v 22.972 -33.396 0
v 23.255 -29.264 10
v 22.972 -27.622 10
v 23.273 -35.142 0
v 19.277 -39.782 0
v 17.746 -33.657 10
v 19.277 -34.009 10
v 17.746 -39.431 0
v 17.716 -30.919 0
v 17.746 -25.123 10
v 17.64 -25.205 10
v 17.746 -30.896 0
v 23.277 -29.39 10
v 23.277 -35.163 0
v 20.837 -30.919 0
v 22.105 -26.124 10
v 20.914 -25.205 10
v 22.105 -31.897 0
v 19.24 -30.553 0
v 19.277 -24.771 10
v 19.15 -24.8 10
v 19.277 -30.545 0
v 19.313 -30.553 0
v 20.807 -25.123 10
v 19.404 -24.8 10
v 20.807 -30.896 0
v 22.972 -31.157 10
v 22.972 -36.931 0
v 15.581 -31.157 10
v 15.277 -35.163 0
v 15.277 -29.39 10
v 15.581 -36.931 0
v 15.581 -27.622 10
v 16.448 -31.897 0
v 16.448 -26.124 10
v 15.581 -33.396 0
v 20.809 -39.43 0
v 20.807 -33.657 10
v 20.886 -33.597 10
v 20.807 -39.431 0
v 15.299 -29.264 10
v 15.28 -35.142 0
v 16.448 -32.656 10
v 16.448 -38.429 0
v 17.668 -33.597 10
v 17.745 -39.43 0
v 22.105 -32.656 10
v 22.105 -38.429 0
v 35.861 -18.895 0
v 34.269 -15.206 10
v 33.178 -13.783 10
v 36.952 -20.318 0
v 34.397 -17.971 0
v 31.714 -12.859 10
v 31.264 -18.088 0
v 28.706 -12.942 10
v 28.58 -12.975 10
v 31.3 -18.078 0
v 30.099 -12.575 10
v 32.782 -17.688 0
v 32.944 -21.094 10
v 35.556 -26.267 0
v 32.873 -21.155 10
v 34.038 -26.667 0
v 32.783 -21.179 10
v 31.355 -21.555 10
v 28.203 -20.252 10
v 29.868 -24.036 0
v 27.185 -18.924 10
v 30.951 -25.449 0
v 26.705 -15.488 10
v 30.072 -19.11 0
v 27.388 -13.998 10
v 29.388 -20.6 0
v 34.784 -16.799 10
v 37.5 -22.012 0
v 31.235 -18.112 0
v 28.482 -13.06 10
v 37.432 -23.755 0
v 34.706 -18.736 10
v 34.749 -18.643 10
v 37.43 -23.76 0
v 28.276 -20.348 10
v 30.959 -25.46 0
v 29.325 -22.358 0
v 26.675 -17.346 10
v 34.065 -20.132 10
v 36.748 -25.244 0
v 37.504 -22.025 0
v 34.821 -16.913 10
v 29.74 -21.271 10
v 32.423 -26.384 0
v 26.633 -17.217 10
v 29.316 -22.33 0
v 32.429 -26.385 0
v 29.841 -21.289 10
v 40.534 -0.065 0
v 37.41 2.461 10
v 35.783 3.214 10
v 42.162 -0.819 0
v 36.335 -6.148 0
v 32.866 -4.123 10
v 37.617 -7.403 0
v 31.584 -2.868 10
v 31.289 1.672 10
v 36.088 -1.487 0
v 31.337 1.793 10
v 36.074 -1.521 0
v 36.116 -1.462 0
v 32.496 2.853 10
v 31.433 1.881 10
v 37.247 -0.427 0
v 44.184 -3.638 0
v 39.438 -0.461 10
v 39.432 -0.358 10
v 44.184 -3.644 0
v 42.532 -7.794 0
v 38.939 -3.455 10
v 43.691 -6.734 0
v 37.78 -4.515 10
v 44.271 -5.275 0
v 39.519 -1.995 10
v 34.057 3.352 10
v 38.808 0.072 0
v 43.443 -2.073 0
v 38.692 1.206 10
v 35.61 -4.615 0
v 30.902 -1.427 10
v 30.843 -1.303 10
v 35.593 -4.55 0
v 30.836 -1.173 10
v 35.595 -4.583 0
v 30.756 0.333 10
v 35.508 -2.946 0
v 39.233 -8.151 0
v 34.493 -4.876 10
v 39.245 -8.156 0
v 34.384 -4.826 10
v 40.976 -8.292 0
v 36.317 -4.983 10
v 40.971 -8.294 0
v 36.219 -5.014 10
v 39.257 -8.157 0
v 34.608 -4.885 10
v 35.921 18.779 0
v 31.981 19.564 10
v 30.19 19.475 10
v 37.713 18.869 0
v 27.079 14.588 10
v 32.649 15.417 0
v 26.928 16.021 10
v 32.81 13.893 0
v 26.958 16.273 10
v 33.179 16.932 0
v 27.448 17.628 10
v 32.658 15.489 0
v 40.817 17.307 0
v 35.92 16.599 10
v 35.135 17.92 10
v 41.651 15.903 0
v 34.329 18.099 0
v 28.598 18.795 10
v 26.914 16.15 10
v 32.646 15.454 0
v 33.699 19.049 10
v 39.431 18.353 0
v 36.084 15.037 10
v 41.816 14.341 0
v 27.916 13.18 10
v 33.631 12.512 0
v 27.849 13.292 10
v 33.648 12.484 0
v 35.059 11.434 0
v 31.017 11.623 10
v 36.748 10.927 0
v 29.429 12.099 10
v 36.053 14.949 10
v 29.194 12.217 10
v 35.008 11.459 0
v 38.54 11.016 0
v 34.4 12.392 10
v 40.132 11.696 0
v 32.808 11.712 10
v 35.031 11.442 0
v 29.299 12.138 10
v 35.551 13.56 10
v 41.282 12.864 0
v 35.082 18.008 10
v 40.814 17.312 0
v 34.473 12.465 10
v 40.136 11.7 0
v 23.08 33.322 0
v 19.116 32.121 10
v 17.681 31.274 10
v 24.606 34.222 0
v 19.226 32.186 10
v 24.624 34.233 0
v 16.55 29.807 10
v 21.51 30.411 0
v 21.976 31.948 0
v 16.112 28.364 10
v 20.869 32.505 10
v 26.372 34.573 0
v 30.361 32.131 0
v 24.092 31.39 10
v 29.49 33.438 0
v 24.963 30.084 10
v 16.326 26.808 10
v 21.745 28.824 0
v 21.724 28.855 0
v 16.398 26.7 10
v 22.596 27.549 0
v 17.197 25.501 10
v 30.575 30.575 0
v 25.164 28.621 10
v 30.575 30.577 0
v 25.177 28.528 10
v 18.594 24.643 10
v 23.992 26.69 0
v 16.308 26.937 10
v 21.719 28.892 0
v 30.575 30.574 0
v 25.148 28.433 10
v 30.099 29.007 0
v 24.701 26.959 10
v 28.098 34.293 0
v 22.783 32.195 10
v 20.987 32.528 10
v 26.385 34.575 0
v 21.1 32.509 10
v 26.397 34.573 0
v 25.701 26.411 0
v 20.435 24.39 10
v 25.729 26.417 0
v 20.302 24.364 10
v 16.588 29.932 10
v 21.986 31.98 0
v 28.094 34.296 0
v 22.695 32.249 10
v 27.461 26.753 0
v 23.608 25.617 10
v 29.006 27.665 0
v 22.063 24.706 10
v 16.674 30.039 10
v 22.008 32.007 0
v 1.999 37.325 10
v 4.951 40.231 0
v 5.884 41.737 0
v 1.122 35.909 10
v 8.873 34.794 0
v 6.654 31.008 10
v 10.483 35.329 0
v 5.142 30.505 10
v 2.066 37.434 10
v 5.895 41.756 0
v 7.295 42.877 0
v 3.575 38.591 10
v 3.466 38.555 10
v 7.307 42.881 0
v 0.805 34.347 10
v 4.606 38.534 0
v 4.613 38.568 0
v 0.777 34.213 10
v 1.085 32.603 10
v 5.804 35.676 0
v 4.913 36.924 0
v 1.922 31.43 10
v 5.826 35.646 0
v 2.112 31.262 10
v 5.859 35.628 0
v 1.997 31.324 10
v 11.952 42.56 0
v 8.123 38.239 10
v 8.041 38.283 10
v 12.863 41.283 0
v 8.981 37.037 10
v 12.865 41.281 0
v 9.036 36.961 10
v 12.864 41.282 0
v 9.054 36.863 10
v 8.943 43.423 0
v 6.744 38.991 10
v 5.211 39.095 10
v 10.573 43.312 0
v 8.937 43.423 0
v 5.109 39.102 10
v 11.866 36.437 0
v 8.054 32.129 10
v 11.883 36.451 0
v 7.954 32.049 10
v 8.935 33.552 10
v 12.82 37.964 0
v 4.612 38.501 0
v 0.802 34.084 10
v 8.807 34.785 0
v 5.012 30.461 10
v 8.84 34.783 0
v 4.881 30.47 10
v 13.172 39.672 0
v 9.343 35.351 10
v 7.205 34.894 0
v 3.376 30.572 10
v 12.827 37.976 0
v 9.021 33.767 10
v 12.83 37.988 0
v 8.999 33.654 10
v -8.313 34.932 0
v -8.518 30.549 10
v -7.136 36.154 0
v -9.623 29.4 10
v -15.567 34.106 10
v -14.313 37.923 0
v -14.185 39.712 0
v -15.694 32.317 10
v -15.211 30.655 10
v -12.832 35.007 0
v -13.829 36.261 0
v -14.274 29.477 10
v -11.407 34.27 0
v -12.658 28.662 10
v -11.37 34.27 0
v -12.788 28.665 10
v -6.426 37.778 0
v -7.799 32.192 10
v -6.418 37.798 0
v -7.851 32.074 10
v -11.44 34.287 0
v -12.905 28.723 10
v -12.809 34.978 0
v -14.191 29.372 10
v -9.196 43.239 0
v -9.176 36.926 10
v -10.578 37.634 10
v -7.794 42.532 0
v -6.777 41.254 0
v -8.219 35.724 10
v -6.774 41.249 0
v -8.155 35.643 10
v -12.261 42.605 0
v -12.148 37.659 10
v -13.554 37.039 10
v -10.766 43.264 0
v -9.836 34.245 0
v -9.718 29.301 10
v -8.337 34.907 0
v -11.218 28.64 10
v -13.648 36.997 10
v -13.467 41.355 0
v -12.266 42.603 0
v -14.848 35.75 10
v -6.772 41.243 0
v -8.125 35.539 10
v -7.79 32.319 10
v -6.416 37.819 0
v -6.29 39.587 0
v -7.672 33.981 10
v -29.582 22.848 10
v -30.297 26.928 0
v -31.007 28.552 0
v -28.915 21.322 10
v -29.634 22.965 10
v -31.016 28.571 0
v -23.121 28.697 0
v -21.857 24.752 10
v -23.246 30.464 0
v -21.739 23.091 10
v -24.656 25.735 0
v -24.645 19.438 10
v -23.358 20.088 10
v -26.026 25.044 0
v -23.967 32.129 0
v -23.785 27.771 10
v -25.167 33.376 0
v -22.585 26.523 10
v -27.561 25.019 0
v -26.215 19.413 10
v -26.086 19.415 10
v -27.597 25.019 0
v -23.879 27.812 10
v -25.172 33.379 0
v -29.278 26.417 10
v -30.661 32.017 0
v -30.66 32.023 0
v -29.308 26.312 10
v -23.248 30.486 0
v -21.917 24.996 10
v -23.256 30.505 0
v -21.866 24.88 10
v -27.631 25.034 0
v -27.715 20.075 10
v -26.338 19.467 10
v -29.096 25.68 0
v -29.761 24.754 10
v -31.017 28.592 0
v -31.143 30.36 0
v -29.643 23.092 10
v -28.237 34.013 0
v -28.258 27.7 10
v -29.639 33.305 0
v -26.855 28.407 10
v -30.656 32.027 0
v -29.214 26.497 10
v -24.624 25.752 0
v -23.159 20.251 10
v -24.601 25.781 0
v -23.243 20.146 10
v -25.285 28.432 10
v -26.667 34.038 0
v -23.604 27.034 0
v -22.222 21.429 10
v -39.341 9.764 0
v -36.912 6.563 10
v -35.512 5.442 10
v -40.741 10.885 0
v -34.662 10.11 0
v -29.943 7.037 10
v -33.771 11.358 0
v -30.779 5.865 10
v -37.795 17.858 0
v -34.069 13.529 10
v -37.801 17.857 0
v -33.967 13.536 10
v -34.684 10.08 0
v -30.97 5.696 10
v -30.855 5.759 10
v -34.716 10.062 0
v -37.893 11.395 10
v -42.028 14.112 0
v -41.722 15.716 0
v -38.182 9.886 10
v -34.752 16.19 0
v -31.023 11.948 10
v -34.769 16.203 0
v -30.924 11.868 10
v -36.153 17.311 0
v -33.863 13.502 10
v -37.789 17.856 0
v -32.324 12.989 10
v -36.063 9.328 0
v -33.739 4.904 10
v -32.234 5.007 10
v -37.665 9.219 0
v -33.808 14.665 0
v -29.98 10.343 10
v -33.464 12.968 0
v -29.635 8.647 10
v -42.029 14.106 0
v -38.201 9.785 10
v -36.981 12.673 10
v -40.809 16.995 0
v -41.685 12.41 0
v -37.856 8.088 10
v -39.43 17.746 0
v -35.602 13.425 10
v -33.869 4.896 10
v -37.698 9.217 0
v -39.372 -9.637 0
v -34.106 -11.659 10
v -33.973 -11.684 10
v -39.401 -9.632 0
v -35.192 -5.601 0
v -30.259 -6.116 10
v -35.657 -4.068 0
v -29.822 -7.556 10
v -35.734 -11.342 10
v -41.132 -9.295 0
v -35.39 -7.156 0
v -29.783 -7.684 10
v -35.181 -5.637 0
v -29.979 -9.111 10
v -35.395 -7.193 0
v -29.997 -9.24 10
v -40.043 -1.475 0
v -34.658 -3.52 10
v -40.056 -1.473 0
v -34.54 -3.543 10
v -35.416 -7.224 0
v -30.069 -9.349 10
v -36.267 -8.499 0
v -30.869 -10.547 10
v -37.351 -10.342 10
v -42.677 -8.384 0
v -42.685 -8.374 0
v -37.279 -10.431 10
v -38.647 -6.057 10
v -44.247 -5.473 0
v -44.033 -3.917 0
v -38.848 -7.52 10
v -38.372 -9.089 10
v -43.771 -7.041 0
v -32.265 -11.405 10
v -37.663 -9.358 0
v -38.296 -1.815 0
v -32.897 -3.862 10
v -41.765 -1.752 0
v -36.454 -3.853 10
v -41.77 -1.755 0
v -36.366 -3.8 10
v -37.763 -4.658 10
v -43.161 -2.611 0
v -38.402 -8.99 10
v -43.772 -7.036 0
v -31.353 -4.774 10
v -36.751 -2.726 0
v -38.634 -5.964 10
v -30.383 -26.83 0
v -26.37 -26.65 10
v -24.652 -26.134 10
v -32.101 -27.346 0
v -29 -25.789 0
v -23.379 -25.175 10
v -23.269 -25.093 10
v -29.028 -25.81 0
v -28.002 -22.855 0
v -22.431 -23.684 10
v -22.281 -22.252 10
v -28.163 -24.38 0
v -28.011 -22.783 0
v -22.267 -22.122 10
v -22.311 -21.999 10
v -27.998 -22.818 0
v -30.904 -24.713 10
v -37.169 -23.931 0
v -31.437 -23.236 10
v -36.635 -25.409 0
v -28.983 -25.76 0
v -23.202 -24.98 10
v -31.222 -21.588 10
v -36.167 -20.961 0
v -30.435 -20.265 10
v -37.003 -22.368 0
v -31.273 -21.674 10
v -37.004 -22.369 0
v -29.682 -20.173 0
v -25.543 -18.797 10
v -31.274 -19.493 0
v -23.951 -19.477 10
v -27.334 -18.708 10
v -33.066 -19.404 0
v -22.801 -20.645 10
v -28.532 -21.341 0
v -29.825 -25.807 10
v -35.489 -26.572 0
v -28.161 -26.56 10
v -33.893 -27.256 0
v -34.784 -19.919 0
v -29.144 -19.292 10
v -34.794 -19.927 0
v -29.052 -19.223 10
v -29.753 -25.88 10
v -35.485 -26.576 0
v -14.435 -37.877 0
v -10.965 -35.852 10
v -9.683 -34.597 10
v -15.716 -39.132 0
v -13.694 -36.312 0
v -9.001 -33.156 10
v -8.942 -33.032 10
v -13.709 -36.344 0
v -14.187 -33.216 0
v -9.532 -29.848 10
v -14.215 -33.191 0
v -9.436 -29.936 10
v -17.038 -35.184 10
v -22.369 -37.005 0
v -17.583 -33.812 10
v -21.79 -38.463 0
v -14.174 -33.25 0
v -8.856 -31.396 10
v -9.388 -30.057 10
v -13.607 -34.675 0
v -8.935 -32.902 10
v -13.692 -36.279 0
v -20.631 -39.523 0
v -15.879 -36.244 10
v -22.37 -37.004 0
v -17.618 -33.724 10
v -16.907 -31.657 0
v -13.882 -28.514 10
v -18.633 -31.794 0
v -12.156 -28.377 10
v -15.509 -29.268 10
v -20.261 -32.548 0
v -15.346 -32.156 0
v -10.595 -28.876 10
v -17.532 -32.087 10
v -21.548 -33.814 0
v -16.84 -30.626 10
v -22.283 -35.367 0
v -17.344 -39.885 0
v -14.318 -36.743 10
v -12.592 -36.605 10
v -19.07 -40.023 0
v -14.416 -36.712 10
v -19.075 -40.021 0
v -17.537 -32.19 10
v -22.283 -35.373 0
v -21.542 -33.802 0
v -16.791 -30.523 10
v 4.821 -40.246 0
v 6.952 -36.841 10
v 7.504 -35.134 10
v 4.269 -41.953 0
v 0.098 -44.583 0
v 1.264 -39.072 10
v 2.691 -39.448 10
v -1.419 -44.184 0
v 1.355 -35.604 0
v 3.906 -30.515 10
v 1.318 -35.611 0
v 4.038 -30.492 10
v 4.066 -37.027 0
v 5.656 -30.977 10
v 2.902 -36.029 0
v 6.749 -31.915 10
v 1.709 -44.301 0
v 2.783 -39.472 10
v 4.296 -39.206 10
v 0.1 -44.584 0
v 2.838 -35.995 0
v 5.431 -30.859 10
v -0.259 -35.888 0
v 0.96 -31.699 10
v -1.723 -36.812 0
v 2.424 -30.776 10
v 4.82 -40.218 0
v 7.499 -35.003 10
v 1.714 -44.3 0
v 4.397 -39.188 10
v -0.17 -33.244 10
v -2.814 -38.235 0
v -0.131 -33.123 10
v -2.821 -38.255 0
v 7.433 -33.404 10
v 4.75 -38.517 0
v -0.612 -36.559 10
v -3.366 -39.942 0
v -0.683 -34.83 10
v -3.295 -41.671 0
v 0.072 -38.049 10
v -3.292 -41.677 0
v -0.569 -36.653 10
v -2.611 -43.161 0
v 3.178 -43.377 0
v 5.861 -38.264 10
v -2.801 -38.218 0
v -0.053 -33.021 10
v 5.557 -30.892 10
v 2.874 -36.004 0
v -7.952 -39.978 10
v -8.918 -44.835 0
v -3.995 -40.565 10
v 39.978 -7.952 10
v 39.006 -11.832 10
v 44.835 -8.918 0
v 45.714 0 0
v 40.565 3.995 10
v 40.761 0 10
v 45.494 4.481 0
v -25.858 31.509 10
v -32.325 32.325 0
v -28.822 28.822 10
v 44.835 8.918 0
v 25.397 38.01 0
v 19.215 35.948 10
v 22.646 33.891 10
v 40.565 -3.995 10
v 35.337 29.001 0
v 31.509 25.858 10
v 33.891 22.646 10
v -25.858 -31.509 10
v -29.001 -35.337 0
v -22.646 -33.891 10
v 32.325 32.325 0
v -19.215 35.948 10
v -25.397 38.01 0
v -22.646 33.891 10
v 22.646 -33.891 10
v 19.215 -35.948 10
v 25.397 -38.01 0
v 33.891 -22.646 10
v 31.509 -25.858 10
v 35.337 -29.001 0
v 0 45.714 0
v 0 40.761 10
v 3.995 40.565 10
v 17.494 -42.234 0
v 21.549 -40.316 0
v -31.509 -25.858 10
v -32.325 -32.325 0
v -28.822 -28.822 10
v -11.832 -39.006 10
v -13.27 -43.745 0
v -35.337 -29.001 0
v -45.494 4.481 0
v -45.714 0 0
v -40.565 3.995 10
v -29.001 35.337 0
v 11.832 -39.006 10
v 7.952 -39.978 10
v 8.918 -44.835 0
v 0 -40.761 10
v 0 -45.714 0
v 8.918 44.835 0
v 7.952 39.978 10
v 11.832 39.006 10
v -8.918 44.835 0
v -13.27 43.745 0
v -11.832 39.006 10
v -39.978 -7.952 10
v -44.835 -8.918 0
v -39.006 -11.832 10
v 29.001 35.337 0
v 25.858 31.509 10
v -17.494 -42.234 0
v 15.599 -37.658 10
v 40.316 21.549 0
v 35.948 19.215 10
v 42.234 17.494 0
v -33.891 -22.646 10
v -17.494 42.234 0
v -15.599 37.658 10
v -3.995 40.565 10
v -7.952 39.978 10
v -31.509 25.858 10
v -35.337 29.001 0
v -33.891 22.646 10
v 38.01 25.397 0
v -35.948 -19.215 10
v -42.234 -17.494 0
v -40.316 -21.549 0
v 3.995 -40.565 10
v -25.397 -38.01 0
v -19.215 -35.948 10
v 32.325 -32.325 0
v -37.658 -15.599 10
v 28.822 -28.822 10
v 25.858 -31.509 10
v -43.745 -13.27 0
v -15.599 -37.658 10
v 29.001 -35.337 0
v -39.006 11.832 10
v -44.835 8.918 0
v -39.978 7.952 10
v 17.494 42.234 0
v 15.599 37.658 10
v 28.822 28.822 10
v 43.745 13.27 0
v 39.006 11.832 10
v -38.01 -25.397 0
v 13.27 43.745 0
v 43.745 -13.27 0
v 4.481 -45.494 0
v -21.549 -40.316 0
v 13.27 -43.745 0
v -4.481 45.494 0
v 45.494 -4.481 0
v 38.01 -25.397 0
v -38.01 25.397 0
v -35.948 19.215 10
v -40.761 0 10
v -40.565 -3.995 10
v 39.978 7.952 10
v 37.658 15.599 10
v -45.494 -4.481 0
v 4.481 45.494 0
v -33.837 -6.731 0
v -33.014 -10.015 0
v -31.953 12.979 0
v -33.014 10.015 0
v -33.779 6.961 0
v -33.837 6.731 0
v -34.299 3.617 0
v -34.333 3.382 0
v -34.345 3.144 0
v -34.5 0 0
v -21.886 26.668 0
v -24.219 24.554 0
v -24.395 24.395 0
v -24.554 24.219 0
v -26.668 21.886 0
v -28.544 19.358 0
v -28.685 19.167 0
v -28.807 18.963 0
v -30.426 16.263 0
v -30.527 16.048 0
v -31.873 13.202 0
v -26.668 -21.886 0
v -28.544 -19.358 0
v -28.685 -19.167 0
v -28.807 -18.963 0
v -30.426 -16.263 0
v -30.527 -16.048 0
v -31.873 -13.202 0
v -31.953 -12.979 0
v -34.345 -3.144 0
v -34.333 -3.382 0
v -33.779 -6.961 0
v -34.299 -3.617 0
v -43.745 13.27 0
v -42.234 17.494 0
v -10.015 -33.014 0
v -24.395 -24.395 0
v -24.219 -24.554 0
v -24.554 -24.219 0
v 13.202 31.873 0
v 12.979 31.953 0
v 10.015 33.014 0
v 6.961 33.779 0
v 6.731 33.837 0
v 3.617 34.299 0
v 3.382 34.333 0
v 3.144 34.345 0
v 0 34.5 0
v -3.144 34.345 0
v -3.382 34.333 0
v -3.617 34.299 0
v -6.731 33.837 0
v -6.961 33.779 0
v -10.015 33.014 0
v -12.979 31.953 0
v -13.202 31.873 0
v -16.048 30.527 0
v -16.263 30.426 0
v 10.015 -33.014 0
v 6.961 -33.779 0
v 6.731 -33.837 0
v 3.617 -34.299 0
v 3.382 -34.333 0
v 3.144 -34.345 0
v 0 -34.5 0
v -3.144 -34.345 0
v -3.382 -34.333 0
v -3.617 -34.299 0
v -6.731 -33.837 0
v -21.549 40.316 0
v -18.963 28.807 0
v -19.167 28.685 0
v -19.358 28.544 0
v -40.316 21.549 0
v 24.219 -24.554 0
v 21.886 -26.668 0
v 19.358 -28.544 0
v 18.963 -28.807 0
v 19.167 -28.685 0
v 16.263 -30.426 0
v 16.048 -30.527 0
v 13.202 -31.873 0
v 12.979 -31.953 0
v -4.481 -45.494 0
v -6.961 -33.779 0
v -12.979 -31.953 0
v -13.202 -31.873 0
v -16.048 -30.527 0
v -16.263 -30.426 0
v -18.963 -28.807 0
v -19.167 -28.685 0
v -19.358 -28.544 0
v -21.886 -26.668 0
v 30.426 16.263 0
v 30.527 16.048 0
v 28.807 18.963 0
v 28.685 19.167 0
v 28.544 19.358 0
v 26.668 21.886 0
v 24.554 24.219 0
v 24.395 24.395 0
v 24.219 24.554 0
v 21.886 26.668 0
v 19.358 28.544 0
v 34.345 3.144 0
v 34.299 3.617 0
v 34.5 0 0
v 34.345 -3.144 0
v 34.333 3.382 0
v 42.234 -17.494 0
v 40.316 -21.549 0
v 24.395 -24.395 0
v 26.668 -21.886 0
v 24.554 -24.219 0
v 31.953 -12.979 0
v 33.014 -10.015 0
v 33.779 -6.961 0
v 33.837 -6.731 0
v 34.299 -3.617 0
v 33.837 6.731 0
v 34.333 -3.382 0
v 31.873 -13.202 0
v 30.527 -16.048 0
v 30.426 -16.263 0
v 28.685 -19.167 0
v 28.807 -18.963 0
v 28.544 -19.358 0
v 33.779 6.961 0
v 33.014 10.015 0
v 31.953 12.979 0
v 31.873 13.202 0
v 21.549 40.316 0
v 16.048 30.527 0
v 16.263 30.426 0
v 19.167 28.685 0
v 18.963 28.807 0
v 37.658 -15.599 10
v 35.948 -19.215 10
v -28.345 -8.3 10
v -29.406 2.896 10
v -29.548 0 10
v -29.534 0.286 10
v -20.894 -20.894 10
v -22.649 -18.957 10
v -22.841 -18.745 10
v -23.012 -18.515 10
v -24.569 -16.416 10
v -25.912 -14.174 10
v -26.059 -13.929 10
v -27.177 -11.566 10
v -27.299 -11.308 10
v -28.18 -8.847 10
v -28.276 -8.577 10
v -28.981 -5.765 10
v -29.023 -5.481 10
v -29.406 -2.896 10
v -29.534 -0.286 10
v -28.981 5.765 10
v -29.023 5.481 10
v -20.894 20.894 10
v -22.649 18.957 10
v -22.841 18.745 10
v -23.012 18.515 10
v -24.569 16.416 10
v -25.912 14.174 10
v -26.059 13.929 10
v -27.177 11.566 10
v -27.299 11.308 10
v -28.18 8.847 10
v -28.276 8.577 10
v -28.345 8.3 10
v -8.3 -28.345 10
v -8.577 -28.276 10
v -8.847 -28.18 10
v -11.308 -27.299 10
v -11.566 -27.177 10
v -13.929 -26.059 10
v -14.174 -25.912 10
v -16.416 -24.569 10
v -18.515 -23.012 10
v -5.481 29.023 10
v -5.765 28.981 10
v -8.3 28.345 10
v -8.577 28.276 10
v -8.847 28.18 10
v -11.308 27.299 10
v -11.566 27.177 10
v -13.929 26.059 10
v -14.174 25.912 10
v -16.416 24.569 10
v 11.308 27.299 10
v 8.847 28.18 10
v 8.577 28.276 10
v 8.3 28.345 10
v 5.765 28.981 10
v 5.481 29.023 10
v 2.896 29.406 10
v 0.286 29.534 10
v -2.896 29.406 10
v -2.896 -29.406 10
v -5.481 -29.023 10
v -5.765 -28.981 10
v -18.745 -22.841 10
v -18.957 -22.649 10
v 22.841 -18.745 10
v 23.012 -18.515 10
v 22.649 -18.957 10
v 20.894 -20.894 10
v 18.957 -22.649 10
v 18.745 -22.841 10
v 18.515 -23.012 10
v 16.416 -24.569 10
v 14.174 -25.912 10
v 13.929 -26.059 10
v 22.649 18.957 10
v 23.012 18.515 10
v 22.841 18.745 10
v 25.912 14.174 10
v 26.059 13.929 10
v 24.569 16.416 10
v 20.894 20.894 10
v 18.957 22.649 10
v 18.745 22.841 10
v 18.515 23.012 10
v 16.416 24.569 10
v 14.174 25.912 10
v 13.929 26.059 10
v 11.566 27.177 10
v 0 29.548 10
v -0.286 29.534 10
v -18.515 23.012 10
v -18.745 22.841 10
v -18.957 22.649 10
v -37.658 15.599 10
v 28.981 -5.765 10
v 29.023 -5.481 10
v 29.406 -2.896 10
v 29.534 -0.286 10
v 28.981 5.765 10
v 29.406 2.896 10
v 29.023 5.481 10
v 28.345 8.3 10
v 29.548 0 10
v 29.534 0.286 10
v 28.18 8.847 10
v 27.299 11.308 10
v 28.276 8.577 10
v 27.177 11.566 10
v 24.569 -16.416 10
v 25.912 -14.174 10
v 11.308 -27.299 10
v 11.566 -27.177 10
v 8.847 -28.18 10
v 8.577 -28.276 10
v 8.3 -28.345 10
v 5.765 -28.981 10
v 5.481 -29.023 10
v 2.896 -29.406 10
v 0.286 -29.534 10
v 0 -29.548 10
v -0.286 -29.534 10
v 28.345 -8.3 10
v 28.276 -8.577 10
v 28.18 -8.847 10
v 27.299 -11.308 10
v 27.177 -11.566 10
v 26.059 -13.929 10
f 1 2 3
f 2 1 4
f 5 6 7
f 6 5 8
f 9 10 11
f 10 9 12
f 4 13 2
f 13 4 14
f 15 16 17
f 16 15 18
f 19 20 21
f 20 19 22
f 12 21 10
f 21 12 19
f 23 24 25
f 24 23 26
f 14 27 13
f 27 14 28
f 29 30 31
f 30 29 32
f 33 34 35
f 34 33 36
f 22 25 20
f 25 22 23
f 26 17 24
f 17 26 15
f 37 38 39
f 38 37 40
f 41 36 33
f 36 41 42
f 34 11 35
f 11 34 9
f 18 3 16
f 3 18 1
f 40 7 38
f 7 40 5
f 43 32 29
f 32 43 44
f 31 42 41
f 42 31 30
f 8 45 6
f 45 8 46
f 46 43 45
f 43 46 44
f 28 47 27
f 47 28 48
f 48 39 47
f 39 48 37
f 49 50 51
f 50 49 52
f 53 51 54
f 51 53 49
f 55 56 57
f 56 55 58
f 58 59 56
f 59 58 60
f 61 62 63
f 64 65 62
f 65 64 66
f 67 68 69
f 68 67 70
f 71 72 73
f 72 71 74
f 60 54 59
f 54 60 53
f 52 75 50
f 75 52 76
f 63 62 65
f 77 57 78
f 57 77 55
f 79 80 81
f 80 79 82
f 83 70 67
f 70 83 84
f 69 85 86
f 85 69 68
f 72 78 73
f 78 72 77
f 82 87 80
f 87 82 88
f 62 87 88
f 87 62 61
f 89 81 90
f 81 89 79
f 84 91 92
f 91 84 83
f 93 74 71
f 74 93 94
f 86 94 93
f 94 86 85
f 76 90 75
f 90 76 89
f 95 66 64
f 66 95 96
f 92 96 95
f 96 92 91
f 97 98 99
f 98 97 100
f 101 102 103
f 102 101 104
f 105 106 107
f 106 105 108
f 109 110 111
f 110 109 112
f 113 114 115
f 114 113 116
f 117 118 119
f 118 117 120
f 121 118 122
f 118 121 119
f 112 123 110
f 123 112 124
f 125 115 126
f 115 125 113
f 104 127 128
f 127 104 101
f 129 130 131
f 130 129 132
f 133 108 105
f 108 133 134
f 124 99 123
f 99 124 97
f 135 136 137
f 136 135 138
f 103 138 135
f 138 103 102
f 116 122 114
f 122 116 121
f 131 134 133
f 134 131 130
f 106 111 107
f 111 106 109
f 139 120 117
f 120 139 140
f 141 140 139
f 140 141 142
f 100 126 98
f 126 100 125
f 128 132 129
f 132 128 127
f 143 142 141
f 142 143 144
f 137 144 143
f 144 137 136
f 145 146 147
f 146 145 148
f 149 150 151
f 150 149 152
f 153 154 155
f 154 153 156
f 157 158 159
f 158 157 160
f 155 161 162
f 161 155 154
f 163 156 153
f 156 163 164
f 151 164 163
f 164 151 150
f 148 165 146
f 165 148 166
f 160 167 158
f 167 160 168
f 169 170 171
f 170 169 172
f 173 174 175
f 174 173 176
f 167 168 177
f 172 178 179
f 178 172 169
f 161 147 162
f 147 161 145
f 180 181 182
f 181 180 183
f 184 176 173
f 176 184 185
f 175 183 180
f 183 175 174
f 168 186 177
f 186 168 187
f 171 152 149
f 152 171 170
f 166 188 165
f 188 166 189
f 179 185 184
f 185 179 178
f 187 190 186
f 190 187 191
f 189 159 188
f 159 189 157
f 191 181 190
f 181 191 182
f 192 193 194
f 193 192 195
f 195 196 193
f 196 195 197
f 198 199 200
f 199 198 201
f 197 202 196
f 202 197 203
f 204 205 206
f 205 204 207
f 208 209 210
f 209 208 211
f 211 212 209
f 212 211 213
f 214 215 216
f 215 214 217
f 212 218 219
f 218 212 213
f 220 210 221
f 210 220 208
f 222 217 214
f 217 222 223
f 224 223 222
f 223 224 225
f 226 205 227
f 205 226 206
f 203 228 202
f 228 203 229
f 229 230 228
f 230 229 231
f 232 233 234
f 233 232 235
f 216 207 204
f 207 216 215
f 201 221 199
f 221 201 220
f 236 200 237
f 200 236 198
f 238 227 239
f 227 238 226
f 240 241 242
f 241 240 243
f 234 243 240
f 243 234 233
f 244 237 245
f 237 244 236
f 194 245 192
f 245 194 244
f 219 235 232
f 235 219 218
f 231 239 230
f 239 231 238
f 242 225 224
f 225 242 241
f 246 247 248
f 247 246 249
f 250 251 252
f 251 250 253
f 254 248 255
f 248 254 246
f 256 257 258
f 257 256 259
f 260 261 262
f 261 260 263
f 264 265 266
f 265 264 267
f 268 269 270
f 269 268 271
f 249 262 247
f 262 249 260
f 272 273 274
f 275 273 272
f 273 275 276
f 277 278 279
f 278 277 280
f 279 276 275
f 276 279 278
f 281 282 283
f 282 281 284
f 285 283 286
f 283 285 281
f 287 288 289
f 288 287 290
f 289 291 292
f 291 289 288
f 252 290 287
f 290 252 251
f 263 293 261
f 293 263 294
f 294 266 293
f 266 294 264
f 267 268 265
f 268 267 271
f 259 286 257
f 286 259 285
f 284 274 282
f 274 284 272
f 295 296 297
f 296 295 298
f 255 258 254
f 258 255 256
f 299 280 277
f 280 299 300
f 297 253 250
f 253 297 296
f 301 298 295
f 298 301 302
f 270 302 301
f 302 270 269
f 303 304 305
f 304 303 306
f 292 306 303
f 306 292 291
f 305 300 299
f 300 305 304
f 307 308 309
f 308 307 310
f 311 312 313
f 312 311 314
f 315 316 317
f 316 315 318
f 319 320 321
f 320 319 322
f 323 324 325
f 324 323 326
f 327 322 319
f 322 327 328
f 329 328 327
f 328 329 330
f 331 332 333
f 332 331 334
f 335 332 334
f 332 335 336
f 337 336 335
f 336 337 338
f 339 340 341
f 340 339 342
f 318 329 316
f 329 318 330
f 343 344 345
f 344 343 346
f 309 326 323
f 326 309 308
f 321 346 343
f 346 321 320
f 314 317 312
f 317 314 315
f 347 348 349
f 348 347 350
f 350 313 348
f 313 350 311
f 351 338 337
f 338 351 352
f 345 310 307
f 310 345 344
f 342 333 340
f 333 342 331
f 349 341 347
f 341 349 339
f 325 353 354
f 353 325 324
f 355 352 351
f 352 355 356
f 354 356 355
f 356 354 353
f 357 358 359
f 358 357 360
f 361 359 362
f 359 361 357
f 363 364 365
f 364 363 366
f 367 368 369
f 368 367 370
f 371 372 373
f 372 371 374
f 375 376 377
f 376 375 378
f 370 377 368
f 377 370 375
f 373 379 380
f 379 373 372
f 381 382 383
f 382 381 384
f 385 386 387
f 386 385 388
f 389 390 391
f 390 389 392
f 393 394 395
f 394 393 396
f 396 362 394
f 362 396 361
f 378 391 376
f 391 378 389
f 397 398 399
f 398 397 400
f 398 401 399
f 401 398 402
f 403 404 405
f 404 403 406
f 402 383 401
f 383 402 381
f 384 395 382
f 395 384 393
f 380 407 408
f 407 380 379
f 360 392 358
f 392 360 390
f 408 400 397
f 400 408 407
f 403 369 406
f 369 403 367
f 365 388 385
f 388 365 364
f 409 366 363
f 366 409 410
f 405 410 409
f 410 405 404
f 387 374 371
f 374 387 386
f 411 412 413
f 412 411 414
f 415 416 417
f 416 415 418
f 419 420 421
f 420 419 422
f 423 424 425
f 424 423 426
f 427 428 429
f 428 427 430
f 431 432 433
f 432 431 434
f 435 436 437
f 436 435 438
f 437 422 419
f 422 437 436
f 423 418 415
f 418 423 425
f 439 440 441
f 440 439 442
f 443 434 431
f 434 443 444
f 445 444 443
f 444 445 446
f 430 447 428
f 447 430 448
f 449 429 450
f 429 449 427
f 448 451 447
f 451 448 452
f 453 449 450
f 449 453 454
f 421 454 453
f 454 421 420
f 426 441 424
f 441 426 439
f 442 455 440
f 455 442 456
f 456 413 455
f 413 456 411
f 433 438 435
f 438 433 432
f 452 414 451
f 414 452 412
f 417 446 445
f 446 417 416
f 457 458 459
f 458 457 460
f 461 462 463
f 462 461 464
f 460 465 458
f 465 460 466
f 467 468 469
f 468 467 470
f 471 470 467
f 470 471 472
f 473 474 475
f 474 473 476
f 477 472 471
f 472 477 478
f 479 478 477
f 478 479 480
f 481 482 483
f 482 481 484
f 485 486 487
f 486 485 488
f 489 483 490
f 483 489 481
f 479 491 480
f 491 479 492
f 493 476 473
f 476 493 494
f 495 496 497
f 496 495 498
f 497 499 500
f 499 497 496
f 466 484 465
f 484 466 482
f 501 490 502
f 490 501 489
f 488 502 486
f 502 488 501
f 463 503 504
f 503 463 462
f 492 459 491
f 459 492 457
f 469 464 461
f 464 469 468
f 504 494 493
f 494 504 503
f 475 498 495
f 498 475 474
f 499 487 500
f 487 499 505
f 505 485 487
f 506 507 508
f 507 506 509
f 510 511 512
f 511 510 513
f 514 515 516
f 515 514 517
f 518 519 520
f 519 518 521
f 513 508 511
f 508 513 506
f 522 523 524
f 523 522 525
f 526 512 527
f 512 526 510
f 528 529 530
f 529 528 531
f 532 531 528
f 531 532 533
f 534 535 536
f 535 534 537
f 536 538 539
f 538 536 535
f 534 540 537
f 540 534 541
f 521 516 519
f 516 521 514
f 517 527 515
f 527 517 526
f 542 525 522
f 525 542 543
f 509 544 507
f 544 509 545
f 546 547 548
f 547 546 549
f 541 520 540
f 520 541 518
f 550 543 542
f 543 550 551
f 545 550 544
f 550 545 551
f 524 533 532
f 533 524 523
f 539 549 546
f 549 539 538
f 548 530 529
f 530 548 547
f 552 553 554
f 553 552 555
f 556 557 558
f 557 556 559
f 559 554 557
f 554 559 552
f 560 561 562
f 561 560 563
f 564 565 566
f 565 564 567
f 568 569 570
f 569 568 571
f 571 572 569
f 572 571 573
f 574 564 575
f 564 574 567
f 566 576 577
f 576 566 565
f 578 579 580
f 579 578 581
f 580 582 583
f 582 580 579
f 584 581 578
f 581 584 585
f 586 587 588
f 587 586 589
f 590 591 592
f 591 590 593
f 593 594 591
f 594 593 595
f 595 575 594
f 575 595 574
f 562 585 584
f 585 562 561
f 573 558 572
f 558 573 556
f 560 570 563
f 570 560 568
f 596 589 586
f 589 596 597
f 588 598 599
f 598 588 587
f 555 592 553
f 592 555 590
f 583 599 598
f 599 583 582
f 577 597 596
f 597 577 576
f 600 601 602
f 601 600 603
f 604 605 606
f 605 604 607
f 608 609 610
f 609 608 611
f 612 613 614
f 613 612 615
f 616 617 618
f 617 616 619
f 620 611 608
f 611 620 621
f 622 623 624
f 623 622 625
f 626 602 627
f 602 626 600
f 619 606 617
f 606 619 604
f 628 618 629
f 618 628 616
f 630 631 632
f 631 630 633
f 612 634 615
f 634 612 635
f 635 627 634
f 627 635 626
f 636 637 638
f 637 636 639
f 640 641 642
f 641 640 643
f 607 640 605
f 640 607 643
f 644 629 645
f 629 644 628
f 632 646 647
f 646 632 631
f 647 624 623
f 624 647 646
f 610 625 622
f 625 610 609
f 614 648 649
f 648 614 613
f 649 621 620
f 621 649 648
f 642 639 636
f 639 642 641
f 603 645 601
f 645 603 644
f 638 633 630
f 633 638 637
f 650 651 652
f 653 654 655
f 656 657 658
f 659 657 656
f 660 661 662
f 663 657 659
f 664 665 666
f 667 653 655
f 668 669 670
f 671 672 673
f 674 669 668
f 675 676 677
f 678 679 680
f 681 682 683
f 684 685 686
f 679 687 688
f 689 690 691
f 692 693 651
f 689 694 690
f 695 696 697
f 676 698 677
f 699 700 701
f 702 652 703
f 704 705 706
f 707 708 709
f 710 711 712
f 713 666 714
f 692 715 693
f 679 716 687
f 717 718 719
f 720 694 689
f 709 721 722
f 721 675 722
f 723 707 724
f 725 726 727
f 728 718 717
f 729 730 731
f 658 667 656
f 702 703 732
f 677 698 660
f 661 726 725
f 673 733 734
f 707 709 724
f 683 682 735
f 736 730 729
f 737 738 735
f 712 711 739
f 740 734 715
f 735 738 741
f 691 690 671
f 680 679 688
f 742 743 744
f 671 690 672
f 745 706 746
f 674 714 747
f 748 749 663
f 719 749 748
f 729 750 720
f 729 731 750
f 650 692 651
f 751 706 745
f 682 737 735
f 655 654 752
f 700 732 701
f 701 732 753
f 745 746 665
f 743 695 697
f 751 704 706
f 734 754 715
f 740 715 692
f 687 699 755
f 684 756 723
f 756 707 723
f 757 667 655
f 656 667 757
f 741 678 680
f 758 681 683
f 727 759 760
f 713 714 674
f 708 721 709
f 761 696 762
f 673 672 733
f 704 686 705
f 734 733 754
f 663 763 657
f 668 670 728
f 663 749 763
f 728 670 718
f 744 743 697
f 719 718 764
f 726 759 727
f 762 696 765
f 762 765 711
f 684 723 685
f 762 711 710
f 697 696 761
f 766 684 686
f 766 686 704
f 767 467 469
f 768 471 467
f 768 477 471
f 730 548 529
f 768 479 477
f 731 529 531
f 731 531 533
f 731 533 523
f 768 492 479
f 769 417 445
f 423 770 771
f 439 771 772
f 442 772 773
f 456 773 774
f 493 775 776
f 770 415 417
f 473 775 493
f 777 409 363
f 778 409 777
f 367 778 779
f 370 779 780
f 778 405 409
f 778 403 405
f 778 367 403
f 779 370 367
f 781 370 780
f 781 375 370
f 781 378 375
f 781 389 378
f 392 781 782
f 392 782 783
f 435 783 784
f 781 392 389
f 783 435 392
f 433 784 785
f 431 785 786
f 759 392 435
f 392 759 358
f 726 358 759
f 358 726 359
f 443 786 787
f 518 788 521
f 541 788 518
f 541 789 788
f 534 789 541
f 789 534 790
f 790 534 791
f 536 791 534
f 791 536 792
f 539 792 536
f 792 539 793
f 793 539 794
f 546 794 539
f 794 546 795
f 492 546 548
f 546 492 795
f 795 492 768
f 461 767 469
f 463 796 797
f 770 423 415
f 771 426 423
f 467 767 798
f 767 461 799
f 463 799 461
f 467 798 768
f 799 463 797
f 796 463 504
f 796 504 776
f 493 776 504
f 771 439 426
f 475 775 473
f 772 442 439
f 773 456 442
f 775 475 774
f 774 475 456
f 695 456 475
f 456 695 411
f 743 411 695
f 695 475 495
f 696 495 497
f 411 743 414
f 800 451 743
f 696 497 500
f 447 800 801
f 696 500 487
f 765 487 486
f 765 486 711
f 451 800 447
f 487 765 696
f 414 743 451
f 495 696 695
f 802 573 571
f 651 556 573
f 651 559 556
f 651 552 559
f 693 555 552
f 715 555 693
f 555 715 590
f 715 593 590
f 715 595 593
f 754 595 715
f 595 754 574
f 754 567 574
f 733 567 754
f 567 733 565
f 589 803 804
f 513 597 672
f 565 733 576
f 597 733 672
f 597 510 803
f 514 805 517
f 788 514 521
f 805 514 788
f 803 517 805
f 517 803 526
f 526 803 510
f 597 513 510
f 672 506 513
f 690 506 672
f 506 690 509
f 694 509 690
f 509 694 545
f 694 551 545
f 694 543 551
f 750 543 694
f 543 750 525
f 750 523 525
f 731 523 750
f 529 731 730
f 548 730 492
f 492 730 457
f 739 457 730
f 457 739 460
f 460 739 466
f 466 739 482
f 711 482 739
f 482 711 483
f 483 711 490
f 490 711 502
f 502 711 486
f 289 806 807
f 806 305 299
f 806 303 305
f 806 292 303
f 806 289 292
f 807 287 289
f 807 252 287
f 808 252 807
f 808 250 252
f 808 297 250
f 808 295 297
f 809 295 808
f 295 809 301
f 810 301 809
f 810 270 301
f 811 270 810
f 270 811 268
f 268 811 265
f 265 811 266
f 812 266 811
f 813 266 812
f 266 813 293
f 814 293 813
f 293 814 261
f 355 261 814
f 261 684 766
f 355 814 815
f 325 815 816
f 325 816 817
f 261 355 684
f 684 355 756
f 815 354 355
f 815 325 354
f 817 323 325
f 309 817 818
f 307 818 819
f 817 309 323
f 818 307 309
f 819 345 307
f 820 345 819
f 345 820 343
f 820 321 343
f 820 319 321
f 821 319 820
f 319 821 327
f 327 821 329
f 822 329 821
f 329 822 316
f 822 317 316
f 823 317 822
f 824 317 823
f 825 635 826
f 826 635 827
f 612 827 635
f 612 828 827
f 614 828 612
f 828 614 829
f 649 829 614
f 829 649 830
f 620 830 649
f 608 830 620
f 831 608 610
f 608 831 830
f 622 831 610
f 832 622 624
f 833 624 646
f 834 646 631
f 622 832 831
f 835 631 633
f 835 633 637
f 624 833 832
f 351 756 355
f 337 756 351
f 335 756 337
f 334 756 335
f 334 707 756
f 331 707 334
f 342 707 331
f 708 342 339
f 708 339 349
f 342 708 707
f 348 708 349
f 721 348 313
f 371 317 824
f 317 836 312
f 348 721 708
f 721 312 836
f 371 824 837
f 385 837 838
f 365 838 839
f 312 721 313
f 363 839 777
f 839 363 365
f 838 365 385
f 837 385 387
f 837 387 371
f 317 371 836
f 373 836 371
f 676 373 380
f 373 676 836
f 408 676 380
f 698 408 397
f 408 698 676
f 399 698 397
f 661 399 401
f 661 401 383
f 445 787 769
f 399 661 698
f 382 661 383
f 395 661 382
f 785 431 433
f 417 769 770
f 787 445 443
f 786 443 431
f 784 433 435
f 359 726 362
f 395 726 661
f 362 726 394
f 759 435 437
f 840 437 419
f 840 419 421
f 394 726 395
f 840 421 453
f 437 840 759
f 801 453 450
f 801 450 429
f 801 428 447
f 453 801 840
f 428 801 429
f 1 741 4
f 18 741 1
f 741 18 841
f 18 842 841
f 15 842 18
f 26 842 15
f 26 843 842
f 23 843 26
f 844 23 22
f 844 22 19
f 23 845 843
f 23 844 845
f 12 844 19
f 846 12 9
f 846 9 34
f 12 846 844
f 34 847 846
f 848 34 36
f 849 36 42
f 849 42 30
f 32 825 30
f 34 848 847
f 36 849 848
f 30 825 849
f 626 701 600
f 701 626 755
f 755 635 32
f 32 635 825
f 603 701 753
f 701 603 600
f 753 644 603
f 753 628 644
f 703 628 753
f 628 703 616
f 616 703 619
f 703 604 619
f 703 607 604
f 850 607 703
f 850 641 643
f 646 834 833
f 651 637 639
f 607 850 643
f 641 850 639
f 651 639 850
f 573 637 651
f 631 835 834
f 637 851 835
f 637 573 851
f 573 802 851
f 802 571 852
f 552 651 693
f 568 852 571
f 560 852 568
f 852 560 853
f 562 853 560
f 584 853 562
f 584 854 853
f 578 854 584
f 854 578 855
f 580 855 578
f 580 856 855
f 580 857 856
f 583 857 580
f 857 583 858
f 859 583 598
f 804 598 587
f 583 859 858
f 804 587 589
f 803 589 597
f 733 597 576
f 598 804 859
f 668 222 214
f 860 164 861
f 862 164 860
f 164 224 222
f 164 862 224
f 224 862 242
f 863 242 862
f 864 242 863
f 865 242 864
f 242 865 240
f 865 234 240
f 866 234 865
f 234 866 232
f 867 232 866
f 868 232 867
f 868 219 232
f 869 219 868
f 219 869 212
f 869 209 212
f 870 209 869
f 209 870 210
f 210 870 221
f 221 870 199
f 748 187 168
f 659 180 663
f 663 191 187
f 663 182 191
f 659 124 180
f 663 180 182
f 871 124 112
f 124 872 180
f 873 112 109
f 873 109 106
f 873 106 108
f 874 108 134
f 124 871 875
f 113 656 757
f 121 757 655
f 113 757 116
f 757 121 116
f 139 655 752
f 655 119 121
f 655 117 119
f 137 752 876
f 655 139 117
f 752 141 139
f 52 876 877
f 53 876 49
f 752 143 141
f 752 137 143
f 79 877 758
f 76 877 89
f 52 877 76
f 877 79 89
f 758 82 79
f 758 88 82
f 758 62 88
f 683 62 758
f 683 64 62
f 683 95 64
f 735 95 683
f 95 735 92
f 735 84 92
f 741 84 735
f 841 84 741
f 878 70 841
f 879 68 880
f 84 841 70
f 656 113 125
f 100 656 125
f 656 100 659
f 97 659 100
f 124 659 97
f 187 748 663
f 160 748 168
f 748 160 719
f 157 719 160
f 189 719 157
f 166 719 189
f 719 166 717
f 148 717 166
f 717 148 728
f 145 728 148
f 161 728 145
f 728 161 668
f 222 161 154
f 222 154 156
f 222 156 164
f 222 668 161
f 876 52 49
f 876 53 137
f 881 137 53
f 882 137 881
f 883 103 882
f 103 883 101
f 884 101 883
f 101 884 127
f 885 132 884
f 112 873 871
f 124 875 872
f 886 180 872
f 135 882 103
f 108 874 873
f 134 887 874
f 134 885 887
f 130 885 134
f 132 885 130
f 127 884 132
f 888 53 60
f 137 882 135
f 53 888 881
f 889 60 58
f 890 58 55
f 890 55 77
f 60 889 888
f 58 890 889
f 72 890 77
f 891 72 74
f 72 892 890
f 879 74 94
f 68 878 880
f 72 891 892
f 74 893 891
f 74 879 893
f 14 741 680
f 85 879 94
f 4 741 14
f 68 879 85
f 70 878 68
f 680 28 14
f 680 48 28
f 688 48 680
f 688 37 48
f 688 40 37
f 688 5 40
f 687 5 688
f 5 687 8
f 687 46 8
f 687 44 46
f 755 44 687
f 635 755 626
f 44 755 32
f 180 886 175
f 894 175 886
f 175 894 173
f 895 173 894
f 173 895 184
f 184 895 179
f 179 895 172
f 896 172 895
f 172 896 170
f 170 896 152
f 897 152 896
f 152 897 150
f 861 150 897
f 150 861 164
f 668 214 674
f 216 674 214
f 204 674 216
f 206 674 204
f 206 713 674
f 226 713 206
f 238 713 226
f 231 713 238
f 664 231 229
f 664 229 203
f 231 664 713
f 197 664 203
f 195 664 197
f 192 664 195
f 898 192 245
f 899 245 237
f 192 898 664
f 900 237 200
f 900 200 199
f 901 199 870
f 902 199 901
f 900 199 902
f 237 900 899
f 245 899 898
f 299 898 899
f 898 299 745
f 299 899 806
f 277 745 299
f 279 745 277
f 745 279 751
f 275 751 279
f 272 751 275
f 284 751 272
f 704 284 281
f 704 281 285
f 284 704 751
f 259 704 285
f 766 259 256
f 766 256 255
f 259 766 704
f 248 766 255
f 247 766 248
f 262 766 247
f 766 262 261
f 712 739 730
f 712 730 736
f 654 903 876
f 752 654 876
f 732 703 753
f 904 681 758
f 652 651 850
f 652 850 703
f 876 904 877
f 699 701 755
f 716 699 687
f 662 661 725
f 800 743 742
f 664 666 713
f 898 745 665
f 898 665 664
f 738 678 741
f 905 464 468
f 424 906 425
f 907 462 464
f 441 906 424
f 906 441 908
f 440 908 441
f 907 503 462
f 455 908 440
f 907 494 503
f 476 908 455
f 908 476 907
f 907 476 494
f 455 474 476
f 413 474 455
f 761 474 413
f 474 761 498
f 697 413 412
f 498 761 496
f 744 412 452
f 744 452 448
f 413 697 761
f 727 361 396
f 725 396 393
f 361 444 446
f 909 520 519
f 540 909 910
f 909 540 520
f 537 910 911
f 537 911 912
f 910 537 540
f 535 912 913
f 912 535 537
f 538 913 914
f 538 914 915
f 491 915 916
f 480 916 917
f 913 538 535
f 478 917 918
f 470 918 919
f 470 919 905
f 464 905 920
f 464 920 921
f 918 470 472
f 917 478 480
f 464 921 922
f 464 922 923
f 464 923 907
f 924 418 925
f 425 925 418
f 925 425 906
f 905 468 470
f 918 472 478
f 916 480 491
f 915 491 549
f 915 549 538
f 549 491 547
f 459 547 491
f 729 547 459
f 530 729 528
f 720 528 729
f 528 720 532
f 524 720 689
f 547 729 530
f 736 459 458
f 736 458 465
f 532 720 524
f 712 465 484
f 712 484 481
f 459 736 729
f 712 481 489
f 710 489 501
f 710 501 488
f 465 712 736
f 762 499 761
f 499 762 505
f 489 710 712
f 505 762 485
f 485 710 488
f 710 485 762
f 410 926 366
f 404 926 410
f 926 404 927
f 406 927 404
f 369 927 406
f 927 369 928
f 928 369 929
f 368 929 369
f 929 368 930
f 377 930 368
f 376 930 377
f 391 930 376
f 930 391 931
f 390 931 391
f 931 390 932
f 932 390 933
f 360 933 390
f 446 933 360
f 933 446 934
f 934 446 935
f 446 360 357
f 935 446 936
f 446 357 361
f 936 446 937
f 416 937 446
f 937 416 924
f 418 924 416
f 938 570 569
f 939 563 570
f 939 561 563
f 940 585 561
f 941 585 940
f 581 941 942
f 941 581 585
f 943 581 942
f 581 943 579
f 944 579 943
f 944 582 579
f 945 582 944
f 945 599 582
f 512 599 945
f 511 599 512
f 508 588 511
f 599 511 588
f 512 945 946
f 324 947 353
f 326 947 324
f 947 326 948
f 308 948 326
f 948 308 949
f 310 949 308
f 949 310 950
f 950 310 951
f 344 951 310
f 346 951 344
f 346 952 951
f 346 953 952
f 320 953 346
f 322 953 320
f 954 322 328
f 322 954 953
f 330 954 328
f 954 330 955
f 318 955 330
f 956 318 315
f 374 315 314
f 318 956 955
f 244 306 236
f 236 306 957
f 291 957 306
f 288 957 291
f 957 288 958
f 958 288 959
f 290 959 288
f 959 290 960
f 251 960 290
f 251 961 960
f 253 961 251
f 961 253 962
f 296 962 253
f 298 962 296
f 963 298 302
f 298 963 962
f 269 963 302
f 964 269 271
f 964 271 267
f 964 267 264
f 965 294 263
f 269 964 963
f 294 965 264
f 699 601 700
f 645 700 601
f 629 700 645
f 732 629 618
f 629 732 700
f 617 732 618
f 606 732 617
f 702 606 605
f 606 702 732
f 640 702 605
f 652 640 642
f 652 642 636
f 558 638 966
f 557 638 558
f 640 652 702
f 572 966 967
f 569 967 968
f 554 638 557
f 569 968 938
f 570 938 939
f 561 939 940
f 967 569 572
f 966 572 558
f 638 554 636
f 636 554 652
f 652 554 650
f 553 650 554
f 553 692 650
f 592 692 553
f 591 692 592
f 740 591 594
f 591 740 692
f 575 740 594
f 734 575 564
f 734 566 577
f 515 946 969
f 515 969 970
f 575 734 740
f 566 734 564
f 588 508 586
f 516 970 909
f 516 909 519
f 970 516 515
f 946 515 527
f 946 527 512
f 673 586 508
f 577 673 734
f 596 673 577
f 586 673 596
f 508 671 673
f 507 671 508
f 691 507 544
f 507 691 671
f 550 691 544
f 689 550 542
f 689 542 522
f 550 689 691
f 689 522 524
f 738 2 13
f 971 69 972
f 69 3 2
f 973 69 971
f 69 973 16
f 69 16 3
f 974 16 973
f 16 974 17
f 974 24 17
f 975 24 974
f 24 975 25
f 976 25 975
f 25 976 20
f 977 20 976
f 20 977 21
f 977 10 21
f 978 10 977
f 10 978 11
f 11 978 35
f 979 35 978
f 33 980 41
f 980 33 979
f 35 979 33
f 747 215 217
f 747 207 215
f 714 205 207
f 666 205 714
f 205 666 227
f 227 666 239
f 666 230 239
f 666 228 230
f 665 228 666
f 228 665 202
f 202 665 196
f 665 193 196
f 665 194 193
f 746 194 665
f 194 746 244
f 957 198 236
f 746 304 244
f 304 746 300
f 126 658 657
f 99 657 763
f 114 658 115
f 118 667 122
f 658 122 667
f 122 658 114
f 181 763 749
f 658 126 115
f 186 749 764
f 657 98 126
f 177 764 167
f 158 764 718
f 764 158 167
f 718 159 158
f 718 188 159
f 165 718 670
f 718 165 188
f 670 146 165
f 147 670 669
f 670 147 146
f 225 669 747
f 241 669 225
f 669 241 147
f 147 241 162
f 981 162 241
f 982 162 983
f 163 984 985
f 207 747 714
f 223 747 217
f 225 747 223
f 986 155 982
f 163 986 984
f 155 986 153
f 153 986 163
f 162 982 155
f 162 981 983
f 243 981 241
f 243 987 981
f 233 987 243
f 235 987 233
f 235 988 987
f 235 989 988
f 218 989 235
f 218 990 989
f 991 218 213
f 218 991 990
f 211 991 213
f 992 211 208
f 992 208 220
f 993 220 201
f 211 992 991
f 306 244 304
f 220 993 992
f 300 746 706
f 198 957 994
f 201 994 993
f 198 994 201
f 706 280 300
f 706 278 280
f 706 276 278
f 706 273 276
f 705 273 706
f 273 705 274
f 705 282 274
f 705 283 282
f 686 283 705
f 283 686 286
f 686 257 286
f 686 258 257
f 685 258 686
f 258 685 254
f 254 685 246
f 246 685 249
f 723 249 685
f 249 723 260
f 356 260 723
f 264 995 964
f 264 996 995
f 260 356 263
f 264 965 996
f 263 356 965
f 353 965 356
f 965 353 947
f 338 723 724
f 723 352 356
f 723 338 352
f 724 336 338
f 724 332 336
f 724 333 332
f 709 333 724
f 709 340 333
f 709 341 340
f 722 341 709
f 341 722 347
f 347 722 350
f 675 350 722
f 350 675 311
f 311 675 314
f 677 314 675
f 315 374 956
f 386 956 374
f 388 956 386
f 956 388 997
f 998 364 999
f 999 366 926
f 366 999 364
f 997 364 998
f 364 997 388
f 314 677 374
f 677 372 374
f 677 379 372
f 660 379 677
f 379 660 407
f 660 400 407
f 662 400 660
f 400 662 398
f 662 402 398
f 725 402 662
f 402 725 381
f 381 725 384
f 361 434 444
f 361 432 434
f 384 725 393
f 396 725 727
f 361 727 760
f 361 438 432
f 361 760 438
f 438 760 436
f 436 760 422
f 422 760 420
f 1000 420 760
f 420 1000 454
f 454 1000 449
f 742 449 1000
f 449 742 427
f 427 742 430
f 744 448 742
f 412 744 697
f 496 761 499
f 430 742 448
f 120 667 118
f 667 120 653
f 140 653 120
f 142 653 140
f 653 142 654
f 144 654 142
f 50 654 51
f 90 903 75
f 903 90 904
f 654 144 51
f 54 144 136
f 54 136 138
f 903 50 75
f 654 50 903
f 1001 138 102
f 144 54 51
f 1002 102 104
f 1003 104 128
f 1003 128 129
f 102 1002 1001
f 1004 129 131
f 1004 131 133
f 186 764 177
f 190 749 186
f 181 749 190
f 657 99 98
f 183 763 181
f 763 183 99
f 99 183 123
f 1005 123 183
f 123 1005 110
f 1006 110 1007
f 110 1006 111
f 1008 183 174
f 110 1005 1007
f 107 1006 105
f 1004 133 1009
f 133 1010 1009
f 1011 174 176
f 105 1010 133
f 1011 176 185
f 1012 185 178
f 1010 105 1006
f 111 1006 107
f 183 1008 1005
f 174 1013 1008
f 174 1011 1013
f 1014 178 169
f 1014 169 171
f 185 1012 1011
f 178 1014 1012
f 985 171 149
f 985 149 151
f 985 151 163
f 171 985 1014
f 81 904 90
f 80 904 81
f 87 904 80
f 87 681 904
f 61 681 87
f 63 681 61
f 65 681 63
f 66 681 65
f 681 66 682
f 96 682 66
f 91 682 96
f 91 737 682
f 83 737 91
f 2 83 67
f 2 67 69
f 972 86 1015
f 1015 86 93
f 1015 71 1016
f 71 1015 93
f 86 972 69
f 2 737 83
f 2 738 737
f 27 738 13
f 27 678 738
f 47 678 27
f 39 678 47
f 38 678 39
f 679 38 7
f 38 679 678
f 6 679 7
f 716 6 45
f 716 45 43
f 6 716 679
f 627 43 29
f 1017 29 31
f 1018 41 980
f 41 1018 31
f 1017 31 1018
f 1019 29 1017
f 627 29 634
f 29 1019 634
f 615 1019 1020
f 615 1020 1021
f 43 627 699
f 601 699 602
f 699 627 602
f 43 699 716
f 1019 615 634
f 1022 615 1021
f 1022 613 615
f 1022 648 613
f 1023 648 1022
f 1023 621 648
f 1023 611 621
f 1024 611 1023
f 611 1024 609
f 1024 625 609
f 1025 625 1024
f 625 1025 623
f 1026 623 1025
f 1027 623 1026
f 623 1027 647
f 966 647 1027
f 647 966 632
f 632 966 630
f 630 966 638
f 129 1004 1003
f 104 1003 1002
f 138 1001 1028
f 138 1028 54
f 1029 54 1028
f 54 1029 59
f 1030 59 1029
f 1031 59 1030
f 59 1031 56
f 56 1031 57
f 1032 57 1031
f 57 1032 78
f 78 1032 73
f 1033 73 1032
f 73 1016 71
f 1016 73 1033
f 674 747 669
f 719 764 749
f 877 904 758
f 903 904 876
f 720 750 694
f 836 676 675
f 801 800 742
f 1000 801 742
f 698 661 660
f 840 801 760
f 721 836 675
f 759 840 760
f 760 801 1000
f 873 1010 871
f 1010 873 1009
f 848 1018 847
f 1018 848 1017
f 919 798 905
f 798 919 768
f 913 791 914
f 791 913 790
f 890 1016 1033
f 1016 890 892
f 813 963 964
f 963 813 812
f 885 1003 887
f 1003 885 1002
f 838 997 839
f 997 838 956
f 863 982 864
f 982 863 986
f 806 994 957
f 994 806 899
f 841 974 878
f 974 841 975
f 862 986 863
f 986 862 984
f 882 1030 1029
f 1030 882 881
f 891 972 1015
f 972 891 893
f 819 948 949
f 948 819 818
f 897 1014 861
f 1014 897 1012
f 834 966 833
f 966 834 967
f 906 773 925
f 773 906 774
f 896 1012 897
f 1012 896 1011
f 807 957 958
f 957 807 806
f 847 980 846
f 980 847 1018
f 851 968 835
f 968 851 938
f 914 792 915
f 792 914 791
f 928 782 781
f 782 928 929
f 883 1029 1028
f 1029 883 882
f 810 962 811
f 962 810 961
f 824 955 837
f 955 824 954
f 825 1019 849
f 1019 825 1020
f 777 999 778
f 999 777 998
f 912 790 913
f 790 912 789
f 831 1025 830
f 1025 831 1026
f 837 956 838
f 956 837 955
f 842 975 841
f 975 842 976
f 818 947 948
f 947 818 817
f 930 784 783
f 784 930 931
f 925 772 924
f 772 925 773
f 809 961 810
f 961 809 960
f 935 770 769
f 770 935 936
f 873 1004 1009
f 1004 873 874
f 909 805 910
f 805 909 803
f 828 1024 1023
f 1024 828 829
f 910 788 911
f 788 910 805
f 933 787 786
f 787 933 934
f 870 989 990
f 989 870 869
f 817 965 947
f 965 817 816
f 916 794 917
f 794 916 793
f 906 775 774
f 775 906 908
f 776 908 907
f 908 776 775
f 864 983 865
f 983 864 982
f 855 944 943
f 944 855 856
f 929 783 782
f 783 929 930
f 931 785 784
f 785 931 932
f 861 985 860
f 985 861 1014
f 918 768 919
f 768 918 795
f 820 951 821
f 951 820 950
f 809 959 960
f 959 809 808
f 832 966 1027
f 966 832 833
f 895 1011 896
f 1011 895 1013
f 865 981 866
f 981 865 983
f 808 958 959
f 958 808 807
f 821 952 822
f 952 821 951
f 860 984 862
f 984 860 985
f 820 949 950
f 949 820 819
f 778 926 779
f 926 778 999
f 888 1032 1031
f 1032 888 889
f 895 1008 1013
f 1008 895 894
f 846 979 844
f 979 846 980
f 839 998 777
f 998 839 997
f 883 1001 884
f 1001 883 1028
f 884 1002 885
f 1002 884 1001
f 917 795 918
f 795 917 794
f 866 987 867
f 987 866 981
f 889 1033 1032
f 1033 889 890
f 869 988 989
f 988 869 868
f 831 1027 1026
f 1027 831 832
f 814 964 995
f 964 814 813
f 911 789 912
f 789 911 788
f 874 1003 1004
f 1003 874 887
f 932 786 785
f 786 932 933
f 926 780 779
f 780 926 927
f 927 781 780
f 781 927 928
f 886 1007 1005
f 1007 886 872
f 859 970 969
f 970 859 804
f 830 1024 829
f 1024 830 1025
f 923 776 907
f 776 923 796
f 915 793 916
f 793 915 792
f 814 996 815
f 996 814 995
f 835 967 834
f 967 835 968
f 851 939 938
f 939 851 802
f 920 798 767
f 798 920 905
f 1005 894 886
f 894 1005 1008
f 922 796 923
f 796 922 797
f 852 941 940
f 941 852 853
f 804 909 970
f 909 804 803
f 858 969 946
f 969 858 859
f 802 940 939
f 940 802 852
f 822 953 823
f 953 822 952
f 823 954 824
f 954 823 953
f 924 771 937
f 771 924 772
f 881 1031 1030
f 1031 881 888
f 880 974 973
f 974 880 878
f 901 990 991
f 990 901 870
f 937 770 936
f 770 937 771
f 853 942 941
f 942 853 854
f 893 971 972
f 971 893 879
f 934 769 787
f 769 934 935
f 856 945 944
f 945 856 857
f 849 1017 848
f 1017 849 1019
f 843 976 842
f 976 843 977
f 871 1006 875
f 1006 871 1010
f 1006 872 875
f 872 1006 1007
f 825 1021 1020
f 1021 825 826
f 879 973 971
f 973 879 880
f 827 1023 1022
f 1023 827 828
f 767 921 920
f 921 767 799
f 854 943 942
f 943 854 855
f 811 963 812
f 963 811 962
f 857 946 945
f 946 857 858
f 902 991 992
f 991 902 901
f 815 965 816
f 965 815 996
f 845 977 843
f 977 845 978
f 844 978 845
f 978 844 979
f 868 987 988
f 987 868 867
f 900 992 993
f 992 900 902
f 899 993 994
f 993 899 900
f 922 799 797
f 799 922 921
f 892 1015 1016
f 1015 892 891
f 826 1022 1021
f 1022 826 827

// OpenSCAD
// [FL_INDEX: keywords="openscad, 3d_parametric, parametric_hyperbolic_pencil__holder, csg_solid" | COT="Parametric OpenSCAD design from 3DCodeverse"]
// Title: parametric hyperbolic pencil  holder

// file: hyperbolic_pencil_holder.scad
// author: clayb.rpi@gmail.com
// date: 2013-11-24
// units: mm
//
// description: a ring to hold a bunch of pencils at an angle
// so the lean on each other.
//
// derived from: http://www.thingiverse.com/thing:8433

//-------------
// User input 
//-------------

// The number of pencils the stand should hold.
NUM_PENCILS = 13;

// The diameter of each pencil
PENCIL_DIAMETER = 8;

// The length of each pencil
PENCIL_LENGTH = 190;

// The angle the pencils should stand at
LEAN_ANGLE = 30;

// The height of the base
BASE_HEIGHT = 10;

// The width of walls around the base.
WALL_WIDTH = 1;

// Shift the intersetion point from the center of the pencils.
PENCIL_SHIFT = 30;

/* [Hidden] */
$fn = 64;


//--------------------------
// Calculated values.
//--------------------------
leanAngle = min(80, max(-80, LEAN_ANGLE));
numPencils = max(2, NUM_PENCILS);
baseHeight = max(0, BASE_HEIGHT);
wallWidth = max(0, WALL_WIDTH);

rodRadius = max(0, PENCIL_DIAMETER) / 2;
rodCutLength = max(BASE_HEIGHT, PENCIL_LENGTH) + 2 * rodRadius * tan(leanAngle);
rodLength = rodCutLength / 2 - PENCIL_SHIFT;

// An offset from the center of the pencils (where they are closet) to their bottoms.
bottom = sin(leanAngle) * rodRadius - cos(leanAngle) * rodLength;

// An approximation of how wide the pencils are when leaning.
a = rodRadius / cos(leanAngle);
b = rodRadius;
theta = 90 / numPencils;

// average of the elliptical angle and the maximal radii to account overlap.
effectiveRodRadius = ((a * b) / sqrt(pow(b * cos(theta), 2) + pow(a * sin(theta), 2)) + a) / 2;

function xRodOffset(h) = effectiveRodRadius / sin(360 / (2 * numPencils));
function yRodOffset(h) = (h - effectiveRodRadius) / tan(90 - leanAngle);
function zRodRadius(h) = sqrt(pow(xRodOffset(h), 2) + pow(yRodOffset(h), 2));

// Debugging output.
echo("base outer diameter", 2 * (zRodRadius(bottom) + effectiveRodRadius + wallWidth));

difference() {
  // the actual base.
  cylinder(r1=zRodRadius(bottom) + effectiveRodRadius + wallWidth,
           r2=zRodRadius(bottom + baseHeight) + effectiveRodRadius + wallWidth,
           h=baseHeight);

  // cut out a hole in the center.
  translate([0, 0, -1])
  cylinder(r1=zRodRadius(bottom - 1) - effectiveRodRadius - wallWidth,
           r2=zRodRadius(bottom + baseHeight + 1) - effectiveRodRadius - wallWidth,
           h=baseHeight + 2);

  #
  // cut out the pencils.
  for (i = [0 : numPencils- 1 ]) {
    rotate([0, 0, i * 360 / numPencils])
    translate([xRodOffset(bottom), yRodOffset(bottom), 0])
    rotate([-leanAngle, 0, 0])
    translate([0, 0, -rodRadius * tan(leanAngle)])
    cylinder(r=rodRadius, h=rodCutLength, $fn=16);
  }
}
